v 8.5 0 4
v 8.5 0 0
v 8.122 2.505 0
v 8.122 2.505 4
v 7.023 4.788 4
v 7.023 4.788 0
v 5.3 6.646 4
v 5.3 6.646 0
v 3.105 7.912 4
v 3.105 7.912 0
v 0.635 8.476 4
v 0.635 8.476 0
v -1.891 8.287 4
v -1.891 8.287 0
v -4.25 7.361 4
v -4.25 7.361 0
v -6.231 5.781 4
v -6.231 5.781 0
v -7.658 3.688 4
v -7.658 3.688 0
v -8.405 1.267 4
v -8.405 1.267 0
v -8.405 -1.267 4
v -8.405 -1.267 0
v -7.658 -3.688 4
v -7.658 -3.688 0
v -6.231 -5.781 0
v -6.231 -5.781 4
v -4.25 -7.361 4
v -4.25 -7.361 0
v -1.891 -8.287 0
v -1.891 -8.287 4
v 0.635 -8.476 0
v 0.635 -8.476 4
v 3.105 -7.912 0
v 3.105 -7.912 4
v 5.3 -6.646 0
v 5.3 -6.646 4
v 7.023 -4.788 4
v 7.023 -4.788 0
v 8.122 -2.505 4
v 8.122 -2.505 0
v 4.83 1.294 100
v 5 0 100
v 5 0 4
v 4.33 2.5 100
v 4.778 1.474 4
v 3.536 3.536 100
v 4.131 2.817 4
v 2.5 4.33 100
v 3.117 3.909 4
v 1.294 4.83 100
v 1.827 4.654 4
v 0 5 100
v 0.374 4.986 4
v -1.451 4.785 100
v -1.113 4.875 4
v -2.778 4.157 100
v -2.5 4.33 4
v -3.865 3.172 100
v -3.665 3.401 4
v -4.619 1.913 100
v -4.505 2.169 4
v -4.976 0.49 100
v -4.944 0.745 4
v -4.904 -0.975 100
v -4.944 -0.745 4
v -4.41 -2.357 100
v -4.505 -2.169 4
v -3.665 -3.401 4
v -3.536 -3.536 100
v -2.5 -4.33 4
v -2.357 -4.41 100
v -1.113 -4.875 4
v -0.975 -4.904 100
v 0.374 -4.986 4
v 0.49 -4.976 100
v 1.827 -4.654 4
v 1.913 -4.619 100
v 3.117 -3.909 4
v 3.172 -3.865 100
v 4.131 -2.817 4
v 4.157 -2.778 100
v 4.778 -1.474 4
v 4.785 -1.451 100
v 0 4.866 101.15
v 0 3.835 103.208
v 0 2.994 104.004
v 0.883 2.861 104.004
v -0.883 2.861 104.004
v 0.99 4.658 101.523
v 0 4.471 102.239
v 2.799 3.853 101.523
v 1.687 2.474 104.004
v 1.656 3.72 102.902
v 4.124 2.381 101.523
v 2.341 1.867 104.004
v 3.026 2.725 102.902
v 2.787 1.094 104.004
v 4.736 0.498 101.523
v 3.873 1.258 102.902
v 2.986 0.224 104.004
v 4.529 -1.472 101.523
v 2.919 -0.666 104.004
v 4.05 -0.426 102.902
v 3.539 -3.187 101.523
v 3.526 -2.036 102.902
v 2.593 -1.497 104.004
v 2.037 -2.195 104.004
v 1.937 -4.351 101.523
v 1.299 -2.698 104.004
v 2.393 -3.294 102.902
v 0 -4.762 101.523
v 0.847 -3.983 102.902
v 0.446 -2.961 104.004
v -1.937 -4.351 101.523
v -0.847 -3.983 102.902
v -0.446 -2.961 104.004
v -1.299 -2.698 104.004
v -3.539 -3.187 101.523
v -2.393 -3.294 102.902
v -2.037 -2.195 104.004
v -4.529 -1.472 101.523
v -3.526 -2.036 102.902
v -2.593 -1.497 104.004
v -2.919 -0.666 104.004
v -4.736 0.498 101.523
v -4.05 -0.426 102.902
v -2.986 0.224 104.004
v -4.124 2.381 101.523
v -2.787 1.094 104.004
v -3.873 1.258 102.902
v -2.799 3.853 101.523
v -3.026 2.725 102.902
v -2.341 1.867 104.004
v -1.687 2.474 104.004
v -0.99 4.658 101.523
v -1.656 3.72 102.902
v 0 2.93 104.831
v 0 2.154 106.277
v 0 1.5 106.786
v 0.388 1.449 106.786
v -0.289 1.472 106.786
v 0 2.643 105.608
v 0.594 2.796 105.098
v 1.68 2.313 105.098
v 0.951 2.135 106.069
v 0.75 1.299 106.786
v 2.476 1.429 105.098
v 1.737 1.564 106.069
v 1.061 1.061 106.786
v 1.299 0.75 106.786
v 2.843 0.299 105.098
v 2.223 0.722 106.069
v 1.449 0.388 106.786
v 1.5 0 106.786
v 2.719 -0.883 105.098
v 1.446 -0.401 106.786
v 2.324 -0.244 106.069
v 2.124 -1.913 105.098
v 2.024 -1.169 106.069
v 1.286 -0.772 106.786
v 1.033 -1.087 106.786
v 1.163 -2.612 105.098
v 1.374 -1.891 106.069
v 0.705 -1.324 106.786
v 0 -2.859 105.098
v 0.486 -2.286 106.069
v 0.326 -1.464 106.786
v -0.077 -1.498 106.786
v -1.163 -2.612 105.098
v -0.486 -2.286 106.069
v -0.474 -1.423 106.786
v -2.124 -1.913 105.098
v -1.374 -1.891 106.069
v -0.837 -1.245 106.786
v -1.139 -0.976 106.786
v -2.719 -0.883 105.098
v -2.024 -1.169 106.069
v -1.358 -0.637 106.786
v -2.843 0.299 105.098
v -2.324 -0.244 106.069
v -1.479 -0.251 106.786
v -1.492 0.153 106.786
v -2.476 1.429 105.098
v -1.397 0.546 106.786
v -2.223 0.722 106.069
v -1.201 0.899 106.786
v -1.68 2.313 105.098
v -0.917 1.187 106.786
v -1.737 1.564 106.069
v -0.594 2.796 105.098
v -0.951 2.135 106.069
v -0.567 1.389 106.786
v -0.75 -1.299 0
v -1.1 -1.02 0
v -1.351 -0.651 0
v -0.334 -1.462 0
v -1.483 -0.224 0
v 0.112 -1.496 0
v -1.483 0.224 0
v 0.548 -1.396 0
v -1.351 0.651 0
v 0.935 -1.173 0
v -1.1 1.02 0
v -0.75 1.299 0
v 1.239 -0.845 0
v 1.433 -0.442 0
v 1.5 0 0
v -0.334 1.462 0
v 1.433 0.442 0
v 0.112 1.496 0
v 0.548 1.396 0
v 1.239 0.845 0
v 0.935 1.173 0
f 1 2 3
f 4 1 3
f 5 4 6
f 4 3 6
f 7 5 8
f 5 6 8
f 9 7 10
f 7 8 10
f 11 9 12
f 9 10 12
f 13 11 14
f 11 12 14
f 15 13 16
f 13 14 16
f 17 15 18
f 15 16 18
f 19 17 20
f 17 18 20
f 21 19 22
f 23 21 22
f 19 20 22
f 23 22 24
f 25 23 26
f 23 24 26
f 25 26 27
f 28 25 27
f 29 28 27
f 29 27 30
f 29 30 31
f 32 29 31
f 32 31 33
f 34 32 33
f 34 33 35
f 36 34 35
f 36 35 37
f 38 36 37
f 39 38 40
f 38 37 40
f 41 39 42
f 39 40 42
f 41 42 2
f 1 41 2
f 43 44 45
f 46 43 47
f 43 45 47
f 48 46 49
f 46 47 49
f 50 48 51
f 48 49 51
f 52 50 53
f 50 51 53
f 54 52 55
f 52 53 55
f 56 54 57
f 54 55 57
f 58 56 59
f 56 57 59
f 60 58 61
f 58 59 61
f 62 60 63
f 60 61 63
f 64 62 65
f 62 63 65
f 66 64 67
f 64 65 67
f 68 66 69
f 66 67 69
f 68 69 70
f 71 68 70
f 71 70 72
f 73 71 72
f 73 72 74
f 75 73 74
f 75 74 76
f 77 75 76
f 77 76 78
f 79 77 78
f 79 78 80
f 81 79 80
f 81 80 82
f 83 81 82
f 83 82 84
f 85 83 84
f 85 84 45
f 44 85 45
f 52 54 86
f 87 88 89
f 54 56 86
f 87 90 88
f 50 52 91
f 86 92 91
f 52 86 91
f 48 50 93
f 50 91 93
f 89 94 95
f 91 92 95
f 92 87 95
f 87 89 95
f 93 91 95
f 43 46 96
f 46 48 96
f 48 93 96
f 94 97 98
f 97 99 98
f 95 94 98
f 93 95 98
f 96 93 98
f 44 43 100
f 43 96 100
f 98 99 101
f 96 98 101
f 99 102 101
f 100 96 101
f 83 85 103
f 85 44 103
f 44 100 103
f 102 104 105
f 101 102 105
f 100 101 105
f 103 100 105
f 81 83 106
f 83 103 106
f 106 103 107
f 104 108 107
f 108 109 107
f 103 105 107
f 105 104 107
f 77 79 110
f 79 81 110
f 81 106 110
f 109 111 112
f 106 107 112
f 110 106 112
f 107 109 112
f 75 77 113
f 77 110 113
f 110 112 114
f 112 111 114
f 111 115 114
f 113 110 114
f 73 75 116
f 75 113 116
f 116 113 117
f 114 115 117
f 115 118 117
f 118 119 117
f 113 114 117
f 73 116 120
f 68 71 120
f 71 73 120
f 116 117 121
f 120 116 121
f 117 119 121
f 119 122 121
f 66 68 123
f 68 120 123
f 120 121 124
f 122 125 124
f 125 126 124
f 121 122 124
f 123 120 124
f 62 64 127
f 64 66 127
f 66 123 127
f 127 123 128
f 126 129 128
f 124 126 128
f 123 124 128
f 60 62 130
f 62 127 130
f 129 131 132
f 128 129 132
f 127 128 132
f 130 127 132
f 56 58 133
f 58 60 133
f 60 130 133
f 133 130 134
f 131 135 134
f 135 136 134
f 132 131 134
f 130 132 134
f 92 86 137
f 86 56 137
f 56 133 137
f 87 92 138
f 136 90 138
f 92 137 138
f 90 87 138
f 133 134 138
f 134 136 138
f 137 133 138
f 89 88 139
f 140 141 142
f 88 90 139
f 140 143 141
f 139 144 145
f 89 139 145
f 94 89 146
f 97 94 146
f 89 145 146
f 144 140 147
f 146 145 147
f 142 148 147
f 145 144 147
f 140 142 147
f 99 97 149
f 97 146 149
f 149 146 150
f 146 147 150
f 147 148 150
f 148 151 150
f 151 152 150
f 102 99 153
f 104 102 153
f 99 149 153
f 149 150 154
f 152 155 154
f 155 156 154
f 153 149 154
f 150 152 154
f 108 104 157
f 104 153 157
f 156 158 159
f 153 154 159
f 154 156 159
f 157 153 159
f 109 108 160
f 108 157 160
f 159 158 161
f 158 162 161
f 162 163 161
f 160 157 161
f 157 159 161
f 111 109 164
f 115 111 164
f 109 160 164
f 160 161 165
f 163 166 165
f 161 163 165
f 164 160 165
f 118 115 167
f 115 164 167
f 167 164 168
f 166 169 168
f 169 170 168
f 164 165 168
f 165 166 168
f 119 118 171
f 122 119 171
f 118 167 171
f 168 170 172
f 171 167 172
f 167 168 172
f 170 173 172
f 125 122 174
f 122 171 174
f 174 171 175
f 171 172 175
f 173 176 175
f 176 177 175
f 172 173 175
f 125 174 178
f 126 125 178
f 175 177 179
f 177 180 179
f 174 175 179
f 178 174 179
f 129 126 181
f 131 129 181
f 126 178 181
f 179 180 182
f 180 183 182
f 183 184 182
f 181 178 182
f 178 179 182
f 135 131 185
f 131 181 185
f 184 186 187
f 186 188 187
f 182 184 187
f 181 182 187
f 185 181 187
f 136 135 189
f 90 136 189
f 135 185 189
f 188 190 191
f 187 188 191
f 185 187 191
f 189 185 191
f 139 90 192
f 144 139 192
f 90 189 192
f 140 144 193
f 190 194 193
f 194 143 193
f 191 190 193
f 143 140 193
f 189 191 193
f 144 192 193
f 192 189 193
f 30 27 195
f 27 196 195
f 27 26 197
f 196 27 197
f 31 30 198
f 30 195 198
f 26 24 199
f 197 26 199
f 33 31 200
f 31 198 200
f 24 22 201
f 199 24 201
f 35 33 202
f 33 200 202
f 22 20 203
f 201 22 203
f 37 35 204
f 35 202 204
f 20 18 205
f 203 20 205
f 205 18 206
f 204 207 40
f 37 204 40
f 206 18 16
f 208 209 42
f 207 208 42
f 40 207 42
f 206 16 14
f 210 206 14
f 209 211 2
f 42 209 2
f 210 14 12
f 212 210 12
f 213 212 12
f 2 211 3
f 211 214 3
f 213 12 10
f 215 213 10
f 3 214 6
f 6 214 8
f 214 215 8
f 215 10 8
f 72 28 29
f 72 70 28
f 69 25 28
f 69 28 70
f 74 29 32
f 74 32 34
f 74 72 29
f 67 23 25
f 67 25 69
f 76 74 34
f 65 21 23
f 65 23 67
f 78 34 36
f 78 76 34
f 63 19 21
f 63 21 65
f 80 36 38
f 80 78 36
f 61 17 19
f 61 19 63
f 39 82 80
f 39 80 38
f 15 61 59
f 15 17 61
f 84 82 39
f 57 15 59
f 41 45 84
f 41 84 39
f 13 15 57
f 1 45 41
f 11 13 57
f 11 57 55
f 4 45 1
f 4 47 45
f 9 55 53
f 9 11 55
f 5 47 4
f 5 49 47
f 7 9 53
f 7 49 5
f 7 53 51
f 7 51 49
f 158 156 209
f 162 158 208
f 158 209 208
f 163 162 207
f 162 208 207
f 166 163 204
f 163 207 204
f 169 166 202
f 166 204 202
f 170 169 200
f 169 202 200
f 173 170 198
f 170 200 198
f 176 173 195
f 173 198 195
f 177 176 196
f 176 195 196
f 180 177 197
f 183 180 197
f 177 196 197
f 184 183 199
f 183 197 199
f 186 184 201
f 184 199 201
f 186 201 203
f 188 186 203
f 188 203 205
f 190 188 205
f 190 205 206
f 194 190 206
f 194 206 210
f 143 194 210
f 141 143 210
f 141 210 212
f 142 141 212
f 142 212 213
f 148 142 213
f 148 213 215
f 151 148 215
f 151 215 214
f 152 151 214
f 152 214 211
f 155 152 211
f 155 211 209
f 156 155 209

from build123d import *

# Parameters (mm, degrees)
F0_R     = 8.5
F1_DEPTH = 4
F2_R     = 5
F3_DEPTH = 100
F6_R     = 1.5
F7_DEPTH = 121.2


with BuildPart() as f1:
    # F0 (on Top) → F1 (new body)
    with BuildSketch(Plane.XY):
        Circle(F0_R)
    extrude(amount=F1_DEPTH)

    # F2 (on Top) → F3 (join)
    with BuildSketch(Plane.XY):
        Circle(F2_R)
    extrude(amount=F3_DEPTH)

    # F4 (on Right) → F5 (revolve)
    with BuildSketch(Plane.YZ):
        with BuildLine():
            Line((0, 104.0042367491), (0, 100))
            Line((0, 100), (5, 100))
            ThreePointArc((5, 100), (4.470554405, 102.2392282849), (2.9943426753, 104.0042367491))
            Line((2.9943426753, 104.0042367491), (0, 104.0042367491))
        make_face()
        with BuildLine():
            ThreePointArc((0, 105), (1.5777858306, 104.7445328403), (2.9943426753, 104.0042367491))
            ThreePointArc((2.9943426753, 104.0042367491), (2.1854582893, 106.243570465), (0, 107.1883887053))
            Line((0, 107.1883887053), (0, 105))
        make_face()
        with BuildLine():
            Line((0, 105), (0, 104.0042367491))
            Line((0, 104.0042367491), (2.9943426753, 104.0042367491))
            ThreePointArc((2.9943426753, 104.0042367491), (1.5777858306, 104.7445328403), (0, 105))
        make_face()
    revolve(axis=Axis((0, 0, 103.5941943526), (0, 0, -1)))

    # F6 (on face) → F7 (cut)
    with BuildSketch(Plane(origin=(0, 0, 0), x_dir=(1, 0, 0), z_dir=(0, 0, -1))):
        Circle(F6_R)
    extrude(amount=-F7_DEPTH, mode=Mode.SUBTRACT)


solid = f1.part
